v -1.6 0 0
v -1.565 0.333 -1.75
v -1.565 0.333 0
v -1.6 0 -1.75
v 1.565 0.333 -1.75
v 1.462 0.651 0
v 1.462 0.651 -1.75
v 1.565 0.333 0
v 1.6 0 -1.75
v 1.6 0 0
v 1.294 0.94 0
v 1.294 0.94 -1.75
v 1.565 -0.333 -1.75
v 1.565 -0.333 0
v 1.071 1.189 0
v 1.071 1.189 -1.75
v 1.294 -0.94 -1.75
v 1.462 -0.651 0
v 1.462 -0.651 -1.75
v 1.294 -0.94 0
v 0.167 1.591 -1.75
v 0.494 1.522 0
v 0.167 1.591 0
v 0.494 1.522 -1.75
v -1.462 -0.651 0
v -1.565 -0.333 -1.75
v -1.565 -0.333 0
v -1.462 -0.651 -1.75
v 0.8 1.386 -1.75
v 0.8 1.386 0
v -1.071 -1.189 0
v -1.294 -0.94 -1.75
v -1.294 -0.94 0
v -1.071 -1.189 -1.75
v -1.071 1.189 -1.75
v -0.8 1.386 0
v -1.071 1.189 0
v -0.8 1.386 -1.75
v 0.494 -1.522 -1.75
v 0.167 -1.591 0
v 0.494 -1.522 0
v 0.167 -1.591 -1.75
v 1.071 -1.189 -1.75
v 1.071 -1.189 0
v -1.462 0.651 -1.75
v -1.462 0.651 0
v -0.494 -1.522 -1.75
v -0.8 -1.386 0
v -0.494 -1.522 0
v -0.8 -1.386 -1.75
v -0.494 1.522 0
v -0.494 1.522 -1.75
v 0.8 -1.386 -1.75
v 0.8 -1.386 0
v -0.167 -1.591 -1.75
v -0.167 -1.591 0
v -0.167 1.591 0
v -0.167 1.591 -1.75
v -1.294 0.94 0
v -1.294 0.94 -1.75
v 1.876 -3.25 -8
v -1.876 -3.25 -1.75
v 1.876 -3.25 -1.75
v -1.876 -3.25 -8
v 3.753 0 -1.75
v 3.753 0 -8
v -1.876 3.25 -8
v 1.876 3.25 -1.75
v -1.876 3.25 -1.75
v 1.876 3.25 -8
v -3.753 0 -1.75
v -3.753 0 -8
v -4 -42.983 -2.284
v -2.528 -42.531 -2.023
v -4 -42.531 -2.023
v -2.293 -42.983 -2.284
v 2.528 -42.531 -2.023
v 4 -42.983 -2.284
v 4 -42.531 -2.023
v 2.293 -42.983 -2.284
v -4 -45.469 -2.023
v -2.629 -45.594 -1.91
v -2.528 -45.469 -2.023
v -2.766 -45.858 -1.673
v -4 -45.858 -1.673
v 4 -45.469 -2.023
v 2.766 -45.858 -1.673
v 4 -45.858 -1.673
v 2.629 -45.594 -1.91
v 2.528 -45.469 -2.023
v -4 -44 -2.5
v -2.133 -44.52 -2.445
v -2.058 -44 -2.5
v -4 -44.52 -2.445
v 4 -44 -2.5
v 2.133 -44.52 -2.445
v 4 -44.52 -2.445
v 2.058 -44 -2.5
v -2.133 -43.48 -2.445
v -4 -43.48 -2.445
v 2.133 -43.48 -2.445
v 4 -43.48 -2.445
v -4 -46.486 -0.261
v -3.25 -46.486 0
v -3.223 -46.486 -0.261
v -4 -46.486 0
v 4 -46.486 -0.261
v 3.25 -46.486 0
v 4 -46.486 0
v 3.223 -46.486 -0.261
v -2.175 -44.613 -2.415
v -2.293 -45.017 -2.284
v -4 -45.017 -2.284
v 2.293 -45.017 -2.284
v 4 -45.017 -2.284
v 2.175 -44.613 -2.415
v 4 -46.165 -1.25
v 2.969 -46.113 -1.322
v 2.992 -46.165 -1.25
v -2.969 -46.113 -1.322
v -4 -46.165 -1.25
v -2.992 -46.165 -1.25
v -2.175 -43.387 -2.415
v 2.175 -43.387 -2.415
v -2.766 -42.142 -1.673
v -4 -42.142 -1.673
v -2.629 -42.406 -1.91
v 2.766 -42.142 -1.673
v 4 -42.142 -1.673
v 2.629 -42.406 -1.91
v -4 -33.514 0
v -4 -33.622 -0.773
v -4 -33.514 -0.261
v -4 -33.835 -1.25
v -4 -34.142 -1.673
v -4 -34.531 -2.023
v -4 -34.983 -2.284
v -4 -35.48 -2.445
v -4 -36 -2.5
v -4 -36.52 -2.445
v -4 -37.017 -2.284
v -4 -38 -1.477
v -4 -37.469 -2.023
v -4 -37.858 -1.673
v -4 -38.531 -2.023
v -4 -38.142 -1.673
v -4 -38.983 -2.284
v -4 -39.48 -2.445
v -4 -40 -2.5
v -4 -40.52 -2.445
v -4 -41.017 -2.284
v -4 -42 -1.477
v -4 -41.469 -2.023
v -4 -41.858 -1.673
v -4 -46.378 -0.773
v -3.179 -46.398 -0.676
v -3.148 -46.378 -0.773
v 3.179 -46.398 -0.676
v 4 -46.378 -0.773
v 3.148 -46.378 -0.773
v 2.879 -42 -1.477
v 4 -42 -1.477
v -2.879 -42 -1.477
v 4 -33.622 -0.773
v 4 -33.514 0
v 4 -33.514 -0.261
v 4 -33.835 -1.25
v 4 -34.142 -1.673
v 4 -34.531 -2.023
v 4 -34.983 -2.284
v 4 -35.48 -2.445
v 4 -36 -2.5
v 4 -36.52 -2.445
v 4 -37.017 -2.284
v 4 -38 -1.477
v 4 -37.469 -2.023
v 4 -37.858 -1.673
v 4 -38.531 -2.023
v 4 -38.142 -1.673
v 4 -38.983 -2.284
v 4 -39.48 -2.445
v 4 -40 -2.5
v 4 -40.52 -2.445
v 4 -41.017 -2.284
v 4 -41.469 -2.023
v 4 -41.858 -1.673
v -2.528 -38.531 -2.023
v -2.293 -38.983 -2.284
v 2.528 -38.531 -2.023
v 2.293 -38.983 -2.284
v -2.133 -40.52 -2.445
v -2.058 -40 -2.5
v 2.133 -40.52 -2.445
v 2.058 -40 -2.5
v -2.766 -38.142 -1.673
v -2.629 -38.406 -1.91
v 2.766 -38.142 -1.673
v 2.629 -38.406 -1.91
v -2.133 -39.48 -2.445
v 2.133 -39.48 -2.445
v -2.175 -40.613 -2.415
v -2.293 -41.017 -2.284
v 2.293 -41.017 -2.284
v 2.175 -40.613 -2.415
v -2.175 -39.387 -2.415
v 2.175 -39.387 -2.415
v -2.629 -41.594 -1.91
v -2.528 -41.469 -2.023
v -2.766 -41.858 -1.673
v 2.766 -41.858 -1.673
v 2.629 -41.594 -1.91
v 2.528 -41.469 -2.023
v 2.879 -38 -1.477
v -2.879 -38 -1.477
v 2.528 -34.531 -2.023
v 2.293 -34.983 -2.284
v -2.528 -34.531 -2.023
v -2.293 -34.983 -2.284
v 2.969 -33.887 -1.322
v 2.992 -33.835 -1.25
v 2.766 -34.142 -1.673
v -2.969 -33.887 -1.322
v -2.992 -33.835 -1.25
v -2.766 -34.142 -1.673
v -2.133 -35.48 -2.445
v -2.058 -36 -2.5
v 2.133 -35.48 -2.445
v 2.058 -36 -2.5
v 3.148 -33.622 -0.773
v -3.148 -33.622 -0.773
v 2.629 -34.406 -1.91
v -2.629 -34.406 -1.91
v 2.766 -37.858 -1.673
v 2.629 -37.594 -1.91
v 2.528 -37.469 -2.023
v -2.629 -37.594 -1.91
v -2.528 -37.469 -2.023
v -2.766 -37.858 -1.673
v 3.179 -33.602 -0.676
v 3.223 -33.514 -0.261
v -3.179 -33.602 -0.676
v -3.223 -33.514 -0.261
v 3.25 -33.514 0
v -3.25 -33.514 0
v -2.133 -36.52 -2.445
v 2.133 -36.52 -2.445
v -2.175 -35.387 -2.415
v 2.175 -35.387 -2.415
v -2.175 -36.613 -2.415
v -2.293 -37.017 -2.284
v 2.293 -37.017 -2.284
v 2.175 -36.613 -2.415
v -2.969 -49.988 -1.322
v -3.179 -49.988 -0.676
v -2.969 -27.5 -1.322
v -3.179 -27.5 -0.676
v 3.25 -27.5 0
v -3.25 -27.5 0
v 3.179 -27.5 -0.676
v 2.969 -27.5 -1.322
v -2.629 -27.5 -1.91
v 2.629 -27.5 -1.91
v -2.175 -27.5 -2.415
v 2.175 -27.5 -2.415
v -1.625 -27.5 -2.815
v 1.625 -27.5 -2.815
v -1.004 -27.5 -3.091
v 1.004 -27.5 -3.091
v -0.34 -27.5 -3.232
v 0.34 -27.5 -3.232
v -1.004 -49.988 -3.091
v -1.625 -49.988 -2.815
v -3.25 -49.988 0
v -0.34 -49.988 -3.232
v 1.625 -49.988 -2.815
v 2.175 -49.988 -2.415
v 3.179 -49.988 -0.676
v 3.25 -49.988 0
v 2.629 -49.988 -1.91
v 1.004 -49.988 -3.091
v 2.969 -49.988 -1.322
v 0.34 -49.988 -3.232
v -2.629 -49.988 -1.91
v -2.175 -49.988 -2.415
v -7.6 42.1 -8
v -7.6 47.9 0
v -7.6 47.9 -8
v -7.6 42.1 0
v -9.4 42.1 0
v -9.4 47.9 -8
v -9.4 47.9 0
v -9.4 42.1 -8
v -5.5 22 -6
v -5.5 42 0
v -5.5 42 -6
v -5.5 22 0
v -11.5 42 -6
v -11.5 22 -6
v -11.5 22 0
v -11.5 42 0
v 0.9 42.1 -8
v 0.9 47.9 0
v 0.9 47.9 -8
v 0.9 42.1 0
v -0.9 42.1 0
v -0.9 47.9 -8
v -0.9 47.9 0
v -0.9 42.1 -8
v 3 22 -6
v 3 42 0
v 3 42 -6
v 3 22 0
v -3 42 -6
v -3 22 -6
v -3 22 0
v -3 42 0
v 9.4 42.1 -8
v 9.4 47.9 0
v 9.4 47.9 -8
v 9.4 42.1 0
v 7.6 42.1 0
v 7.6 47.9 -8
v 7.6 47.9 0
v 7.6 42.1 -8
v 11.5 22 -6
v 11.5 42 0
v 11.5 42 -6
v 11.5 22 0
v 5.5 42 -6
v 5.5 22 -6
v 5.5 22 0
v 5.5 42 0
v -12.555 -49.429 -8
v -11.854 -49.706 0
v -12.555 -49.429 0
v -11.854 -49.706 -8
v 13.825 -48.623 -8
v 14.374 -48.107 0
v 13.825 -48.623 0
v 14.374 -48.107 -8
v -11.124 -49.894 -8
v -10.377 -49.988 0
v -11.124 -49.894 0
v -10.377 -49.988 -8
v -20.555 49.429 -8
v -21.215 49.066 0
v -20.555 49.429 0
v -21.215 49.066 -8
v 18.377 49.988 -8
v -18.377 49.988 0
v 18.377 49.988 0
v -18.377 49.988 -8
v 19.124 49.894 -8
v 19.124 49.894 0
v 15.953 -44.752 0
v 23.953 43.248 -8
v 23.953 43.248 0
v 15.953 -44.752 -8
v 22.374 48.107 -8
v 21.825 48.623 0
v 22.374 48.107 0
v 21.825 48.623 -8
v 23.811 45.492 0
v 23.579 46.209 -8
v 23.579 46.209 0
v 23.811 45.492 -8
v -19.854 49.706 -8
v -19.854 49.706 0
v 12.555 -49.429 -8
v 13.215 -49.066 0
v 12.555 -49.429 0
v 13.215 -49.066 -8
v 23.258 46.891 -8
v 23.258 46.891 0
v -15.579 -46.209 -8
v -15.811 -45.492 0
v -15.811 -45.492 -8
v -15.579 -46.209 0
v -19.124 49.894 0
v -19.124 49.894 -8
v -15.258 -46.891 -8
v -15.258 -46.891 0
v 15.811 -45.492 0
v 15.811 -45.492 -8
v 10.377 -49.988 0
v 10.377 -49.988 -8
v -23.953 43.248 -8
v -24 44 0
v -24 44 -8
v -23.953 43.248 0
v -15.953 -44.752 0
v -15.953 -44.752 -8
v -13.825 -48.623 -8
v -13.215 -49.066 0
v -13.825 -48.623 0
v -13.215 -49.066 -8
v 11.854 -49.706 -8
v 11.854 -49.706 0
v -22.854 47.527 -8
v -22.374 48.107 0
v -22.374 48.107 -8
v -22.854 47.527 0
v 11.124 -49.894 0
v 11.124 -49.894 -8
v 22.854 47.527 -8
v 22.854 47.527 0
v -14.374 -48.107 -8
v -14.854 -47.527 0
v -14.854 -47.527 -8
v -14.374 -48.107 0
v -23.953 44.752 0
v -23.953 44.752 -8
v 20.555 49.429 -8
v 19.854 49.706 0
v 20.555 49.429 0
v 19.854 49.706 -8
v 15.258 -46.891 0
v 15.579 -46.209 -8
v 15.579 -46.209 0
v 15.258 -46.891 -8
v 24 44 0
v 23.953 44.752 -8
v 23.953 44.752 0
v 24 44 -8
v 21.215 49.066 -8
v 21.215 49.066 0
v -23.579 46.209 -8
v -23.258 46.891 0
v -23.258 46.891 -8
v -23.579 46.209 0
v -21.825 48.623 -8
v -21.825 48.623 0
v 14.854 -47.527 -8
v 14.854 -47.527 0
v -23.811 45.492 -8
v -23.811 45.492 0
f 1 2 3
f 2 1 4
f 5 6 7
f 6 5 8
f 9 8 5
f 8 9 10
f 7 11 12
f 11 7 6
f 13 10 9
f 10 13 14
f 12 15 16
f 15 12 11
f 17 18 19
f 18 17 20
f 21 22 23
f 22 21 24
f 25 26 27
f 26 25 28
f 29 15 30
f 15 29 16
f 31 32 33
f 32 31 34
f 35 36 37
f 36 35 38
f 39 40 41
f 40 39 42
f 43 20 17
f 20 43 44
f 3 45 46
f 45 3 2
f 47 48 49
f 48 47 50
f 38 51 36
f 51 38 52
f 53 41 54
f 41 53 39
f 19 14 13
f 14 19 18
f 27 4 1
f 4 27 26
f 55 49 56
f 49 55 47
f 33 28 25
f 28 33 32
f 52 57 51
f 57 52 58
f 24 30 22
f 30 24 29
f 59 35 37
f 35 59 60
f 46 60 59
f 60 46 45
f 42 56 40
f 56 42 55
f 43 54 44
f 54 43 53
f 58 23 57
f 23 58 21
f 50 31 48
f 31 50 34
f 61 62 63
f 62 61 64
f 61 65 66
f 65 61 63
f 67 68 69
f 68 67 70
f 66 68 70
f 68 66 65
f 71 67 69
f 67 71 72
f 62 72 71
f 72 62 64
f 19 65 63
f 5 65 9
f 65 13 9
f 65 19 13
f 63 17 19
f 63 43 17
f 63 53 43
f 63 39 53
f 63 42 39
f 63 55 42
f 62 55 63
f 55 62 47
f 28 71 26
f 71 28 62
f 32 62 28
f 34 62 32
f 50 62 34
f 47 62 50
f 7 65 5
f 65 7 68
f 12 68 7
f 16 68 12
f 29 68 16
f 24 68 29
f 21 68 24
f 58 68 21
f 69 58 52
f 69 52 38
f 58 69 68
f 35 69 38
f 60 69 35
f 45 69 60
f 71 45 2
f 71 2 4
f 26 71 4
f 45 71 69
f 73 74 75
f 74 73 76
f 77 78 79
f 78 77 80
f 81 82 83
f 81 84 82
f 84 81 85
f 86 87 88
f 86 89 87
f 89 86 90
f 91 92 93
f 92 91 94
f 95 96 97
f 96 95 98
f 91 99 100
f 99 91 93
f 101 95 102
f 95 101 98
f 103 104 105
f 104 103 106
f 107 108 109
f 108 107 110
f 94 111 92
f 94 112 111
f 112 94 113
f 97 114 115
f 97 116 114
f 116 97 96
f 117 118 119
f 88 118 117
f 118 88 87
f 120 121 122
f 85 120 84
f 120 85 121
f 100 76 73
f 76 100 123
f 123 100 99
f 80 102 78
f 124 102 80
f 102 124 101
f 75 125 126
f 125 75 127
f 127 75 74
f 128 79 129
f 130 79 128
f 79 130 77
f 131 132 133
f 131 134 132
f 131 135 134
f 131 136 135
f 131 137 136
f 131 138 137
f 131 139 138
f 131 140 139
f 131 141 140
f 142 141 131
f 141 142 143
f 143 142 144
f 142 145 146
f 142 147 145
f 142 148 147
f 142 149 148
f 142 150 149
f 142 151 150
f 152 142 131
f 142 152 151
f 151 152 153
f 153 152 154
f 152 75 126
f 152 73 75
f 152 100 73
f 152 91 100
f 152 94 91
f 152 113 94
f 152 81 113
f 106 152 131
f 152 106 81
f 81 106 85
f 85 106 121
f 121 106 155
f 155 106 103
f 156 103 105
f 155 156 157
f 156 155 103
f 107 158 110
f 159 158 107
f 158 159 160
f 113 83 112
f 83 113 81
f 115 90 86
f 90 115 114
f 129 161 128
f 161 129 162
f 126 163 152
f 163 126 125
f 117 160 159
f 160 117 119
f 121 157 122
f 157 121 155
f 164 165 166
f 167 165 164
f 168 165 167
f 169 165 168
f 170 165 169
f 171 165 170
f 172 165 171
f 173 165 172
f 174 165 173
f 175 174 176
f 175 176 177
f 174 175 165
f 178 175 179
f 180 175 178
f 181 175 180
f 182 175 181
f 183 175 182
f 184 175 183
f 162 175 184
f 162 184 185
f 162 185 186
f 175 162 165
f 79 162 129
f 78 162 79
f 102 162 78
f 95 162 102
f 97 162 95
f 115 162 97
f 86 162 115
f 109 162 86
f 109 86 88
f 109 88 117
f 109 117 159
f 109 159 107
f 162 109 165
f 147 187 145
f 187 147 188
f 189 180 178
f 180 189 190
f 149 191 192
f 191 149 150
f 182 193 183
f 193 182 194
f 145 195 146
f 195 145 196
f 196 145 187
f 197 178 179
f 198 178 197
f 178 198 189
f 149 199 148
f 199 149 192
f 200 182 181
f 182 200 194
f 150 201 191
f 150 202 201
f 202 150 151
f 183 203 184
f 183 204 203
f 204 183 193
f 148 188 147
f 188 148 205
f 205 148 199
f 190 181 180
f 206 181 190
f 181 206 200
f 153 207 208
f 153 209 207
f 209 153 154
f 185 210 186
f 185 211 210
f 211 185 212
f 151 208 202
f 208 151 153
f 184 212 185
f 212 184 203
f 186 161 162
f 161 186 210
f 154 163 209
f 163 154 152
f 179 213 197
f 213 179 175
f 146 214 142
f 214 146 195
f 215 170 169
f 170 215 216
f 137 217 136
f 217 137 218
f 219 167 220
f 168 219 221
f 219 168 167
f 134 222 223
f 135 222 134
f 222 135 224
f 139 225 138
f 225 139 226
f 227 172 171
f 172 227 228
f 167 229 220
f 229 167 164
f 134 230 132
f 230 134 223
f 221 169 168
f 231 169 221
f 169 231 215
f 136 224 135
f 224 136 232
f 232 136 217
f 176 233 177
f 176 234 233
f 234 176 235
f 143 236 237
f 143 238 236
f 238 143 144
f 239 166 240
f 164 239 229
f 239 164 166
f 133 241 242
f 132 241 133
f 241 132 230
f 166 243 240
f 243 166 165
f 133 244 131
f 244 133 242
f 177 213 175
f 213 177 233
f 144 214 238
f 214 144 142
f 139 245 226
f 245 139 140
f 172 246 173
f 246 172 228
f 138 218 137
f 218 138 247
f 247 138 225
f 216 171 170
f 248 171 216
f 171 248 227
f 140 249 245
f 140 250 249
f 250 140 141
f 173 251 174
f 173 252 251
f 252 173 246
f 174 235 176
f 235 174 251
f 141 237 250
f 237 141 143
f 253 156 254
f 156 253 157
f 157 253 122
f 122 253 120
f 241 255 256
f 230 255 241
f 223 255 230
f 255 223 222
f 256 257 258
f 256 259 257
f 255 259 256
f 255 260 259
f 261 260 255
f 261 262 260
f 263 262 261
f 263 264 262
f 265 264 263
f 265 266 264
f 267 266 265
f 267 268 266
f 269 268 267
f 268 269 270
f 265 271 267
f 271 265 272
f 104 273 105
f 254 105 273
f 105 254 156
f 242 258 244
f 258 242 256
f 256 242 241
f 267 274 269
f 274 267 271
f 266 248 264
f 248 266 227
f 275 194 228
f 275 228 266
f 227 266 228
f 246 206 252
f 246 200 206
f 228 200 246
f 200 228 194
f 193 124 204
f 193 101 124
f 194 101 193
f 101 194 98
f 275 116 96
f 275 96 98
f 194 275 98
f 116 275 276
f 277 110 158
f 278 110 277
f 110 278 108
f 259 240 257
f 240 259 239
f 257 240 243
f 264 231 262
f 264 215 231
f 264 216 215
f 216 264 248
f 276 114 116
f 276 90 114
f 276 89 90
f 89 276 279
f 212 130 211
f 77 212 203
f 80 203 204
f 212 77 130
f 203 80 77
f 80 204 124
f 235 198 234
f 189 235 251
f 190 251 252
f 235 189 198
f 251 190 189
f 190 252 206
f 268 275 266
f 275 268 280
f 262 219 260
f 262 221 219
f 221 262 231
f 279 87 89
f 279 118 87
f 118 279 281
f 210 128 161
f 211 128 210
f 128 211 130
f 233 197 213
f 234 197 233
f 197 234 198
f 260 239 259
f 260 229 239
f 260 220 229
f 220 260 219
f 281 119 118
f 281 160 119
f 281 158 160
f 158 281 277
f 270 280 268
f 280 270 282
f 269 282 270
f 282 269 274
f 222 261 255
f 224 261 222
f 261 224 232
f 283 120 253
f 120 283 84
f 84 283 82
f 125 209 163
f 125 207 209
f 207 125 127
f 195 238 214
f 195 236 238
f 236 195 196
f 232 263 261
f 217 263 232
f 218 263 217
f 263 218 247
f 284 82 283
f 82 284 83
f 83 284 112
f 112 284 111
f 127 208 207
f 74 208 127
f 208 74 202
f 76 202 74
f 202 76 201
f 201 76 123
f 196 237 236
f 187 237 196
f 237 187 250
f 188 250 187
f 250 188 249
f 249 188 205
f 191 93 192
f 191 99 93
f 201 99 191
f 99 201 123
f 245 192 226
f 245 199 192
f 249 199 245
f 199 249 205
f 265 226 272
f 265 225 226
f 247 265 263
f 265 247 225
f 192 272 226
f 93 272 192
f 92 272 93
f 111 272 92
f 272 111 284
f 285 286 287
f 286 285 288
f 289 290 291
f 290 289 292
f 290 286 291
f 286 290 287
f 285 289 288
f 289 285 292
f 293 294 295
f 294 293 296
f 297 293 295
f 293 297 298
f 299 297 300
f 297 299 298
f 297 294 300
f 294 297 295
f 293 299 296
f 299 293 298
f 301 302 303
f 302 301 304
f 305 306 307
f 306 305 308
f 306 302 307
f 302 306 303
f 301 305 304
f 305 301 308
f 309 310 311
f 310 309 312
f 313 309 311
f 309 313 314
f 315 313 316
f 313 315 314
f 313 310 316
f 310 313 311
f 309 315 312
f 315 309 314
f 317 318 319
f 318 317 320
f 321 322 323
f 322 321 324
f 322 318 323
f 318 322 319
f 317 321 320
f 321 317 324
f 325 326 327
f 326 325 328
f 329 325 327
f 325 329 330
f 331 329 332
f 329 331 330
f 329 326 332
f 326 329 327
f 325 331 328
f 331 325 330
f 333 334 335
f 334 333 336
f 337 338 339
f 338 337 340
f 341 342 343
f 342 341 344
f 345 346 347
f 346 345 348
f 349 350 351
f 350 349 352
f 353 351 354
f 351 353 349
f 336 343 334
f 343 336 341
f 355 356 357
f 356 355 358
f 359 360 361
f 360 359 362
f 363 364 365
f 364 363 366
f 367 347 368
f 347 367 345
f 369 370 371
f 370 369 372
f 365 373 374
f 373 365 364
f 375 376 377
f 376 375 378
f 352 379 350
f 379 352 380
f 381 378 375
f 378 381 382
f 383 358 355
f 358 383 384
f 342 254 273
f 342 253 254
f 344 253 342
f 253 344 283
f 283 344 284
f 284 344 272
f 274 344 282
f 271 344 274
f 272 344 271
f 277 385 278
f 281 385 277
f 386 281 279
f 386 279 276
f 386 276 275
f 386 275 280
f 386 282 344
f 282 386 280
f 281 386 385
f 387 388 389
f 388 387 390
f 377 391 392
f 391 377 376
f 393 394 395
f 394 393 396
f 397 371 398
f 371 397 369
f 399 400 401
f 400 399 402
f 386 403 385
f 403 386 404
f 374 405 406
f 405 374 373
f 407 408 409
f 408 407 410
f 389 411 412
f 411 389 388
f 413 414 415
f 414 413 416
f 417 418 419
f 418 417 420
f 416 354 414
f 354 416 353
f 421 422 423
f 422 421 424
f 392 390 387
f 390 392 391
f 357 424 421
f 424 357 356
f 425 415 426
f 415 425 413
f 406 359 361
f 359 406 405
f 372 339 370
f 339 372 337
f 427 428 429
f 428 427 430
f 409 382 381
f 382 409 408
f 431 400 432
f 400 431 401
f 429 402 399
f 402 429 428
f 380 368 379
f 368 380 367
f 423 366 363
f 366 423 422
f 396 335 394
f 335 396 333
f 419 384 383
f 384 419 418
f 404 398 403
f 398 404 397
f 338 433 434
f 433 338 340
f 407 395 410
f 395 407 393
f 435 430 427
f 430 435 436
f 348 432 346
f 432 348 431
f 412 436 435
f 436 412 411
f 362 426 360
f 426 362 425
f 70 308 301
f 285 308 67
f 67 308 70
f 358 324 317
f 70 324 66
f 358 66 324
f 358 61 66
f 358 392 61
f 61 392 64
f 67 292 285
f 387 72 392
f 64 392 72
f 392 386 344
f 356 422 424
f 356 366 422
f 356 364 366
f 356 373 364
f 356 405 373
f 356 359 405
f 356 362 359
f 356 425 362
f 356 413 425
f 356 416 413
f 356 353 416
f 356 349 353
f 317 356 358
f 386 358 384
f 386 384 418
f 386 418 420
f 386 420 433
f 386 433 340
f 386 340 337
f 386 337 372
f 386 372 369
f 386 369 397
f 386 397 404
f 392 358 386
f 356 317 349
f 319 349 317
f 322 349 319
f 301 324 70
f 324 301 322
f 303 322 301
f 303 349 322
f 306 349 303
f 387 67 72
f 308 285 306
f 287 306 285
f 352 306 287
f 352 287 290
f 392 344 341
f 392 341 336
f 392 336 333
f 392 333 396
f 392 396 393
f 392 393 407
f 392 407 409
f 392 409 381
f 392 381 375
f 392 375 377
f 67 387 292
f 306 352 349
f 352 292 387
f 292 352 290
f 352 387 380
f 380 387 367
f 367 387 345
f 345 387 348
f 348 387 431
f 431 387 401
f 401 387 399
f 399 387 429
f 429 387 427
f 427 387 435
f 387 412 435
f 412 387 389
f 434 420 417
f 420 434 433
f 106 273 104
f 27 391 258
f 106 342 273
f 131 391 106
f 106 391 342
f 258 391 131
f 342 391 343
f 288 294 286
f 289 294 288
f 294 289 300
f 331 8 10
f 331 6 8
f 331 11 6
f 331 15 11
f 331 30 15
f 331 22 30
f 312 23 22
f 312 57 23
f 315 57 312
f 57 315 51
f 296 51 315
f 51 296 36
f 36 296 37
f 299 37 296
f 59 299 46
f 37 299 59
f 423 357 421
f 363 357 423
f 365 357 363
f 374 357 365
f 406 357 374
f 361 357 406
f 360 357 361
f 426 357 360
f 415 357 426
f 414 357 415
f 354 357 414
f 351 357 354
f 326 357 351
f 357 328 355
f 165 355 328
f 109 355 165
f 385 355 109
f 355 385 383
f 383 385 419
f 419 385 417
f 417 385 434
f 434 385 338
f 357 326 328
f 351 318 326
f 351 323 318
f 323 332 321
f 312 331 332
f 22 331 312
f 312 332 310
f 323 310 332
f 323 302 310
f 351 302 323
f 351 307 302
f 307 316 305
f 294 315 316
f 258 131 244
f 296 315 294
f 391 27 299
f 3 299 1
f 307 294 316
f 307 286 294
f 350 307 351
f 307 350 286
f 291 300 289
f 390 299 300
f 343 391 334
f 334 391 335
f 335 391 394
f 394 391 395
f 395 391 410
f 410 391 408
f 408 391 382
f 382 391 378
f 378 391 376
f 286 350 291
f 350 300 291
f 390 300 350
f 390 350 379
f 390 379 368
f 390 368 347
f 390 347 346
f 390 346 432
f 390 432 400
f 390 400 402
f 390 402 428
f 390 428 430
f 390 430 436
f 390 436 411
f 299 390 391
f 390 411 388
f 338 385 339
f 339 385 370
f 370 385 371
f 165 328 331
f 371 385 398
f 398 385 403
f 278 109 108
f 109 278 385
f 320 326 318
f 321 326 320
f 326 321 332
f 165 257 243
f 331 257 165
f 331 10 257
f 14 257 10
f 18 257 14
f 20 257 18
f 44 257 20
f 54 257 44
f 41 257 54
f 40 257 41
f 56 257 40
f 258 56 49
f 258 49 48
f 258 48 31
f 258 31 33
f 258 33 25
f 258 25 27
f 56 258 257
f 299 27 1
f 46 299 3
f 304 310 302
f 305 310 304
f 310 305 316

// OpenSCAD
// Opcja 2: Pełny model parametryczny tworzony od zera
// Odbudowany na podstawie przybliżonych gabarytów oryginalnej wtyczki (48x100mm)

render_part = "bottom"; // [top, bottom, both]

// Gabaryty
plug_width = 48.0;
plug_length = 100.0;
plug_height = 16.0; // pełna wysokość złączonych 2 połówek
corner_radius = 6.0;
back_taper = 8.0; // zwężenie z tyłu wtyczki

// Tolerancja druku
print_tolerance = 0.2; 

// Piny
pin_spacing = 8.5; 
pin_slot_width = 1.6 + print_tolerance;
pin_slot_length = 5.6 + print_tolerance;

module outer_shell() {
    hull() {
        // Przednie rogi (strona wtykana do maszyny)
        translate([plug_width/2 - corner_radius, plug_length/2 - corner_radius, 0]) 
            cylinder(r=corner_radius, h=plug_height, center=true, $fn=50);
        translate([-plug_width/2 + corner_radius, plug_length/2 - corner_radius, 0]) 
            cylinder(r=corner_radius, h=plug_height, center=true, $fn=50);
            
        // Tylne rogi (zwężone na dłoń i kabel)
        translate([plug_width/2 - corner_radius - back_taper, -plug_length/2 + corner_radius, 0]) 
            cylinder(r=corner_radius, h=plug_height, center=true, $fn=50);
        translate([-plug_width/2 + corner_radius + back_taper, -plug_length/2 + corner_radius, 0]) 
            cylinder(r=corner_radius, h=plug_height, center=true, $fn=50);
    }
}

module screw_holes() {
    translate([0, 0, 0]) {
        cylinder(d=3.2, h=plug_height+2, center=true, $fn=30);
        translate([0, 0, plug_height/2 - 3]) cylinder(d=6.0, h=6.5, center=true, $fn=30);
        translate([0, 0, -plug_height/2 + 3]) cylinder(d=6.5 / cos(30), h=6.5, center=true, $fn=6); 
    }
}

module cable_strain_relief() {
    translate([0, -plug_length/2 + 10, 0]) {
        rotate([90,0,0]) cylinder(d=6.5, h=25, center=true, $fn=30);
        for(y = [-4: 4: 4]) {
            translate([0, y, 0])
                rotate([0, 90, 0]) cylinder(d=5.0, h=8.0, center=true, $fn=30);
        }
    }
}

module pin_slots() {
    // 3 piny ustawione pionowo
    for(x = [-pin_spacing, 0, pin_spacing]) {
        // Wylot pinu
        translate([x, plug_length/2 - 5, 0])
            cube([pin_slot_width, pin_slot_length, plug_height + 2], center=true);
            
        // Wnęka na złącze
        translate([x, plug_length/2 - 18, 0])
            cube([6.0, 20.0, plug_height - 4], center=true);
    }
}

module elna_plug_option2() {
    difference() {
        outer_shell();
        screw_holes();
        cable_strain_relief();
        pin_slots();
    }
}

module render_split() {
    if (render_part == "both") {
        elna_plug_option2();
    } else if (render_part == "bottom") {
        difference() {
            elna_plug_option2();
            translate([0, 0, plug_height]) cube([plug_width+5, plug_length+5, plug_height*2], center=true);
        }
    } else if (render_part == "top") {
        rotate([180, 0, 0]) difference() {
            elna_plug_option2();
            translate([0, 0, -plug_height]) cube([plug_width+5, plug_length+5, plug_height*2], center=true);
        }
    }
}

render_split();
